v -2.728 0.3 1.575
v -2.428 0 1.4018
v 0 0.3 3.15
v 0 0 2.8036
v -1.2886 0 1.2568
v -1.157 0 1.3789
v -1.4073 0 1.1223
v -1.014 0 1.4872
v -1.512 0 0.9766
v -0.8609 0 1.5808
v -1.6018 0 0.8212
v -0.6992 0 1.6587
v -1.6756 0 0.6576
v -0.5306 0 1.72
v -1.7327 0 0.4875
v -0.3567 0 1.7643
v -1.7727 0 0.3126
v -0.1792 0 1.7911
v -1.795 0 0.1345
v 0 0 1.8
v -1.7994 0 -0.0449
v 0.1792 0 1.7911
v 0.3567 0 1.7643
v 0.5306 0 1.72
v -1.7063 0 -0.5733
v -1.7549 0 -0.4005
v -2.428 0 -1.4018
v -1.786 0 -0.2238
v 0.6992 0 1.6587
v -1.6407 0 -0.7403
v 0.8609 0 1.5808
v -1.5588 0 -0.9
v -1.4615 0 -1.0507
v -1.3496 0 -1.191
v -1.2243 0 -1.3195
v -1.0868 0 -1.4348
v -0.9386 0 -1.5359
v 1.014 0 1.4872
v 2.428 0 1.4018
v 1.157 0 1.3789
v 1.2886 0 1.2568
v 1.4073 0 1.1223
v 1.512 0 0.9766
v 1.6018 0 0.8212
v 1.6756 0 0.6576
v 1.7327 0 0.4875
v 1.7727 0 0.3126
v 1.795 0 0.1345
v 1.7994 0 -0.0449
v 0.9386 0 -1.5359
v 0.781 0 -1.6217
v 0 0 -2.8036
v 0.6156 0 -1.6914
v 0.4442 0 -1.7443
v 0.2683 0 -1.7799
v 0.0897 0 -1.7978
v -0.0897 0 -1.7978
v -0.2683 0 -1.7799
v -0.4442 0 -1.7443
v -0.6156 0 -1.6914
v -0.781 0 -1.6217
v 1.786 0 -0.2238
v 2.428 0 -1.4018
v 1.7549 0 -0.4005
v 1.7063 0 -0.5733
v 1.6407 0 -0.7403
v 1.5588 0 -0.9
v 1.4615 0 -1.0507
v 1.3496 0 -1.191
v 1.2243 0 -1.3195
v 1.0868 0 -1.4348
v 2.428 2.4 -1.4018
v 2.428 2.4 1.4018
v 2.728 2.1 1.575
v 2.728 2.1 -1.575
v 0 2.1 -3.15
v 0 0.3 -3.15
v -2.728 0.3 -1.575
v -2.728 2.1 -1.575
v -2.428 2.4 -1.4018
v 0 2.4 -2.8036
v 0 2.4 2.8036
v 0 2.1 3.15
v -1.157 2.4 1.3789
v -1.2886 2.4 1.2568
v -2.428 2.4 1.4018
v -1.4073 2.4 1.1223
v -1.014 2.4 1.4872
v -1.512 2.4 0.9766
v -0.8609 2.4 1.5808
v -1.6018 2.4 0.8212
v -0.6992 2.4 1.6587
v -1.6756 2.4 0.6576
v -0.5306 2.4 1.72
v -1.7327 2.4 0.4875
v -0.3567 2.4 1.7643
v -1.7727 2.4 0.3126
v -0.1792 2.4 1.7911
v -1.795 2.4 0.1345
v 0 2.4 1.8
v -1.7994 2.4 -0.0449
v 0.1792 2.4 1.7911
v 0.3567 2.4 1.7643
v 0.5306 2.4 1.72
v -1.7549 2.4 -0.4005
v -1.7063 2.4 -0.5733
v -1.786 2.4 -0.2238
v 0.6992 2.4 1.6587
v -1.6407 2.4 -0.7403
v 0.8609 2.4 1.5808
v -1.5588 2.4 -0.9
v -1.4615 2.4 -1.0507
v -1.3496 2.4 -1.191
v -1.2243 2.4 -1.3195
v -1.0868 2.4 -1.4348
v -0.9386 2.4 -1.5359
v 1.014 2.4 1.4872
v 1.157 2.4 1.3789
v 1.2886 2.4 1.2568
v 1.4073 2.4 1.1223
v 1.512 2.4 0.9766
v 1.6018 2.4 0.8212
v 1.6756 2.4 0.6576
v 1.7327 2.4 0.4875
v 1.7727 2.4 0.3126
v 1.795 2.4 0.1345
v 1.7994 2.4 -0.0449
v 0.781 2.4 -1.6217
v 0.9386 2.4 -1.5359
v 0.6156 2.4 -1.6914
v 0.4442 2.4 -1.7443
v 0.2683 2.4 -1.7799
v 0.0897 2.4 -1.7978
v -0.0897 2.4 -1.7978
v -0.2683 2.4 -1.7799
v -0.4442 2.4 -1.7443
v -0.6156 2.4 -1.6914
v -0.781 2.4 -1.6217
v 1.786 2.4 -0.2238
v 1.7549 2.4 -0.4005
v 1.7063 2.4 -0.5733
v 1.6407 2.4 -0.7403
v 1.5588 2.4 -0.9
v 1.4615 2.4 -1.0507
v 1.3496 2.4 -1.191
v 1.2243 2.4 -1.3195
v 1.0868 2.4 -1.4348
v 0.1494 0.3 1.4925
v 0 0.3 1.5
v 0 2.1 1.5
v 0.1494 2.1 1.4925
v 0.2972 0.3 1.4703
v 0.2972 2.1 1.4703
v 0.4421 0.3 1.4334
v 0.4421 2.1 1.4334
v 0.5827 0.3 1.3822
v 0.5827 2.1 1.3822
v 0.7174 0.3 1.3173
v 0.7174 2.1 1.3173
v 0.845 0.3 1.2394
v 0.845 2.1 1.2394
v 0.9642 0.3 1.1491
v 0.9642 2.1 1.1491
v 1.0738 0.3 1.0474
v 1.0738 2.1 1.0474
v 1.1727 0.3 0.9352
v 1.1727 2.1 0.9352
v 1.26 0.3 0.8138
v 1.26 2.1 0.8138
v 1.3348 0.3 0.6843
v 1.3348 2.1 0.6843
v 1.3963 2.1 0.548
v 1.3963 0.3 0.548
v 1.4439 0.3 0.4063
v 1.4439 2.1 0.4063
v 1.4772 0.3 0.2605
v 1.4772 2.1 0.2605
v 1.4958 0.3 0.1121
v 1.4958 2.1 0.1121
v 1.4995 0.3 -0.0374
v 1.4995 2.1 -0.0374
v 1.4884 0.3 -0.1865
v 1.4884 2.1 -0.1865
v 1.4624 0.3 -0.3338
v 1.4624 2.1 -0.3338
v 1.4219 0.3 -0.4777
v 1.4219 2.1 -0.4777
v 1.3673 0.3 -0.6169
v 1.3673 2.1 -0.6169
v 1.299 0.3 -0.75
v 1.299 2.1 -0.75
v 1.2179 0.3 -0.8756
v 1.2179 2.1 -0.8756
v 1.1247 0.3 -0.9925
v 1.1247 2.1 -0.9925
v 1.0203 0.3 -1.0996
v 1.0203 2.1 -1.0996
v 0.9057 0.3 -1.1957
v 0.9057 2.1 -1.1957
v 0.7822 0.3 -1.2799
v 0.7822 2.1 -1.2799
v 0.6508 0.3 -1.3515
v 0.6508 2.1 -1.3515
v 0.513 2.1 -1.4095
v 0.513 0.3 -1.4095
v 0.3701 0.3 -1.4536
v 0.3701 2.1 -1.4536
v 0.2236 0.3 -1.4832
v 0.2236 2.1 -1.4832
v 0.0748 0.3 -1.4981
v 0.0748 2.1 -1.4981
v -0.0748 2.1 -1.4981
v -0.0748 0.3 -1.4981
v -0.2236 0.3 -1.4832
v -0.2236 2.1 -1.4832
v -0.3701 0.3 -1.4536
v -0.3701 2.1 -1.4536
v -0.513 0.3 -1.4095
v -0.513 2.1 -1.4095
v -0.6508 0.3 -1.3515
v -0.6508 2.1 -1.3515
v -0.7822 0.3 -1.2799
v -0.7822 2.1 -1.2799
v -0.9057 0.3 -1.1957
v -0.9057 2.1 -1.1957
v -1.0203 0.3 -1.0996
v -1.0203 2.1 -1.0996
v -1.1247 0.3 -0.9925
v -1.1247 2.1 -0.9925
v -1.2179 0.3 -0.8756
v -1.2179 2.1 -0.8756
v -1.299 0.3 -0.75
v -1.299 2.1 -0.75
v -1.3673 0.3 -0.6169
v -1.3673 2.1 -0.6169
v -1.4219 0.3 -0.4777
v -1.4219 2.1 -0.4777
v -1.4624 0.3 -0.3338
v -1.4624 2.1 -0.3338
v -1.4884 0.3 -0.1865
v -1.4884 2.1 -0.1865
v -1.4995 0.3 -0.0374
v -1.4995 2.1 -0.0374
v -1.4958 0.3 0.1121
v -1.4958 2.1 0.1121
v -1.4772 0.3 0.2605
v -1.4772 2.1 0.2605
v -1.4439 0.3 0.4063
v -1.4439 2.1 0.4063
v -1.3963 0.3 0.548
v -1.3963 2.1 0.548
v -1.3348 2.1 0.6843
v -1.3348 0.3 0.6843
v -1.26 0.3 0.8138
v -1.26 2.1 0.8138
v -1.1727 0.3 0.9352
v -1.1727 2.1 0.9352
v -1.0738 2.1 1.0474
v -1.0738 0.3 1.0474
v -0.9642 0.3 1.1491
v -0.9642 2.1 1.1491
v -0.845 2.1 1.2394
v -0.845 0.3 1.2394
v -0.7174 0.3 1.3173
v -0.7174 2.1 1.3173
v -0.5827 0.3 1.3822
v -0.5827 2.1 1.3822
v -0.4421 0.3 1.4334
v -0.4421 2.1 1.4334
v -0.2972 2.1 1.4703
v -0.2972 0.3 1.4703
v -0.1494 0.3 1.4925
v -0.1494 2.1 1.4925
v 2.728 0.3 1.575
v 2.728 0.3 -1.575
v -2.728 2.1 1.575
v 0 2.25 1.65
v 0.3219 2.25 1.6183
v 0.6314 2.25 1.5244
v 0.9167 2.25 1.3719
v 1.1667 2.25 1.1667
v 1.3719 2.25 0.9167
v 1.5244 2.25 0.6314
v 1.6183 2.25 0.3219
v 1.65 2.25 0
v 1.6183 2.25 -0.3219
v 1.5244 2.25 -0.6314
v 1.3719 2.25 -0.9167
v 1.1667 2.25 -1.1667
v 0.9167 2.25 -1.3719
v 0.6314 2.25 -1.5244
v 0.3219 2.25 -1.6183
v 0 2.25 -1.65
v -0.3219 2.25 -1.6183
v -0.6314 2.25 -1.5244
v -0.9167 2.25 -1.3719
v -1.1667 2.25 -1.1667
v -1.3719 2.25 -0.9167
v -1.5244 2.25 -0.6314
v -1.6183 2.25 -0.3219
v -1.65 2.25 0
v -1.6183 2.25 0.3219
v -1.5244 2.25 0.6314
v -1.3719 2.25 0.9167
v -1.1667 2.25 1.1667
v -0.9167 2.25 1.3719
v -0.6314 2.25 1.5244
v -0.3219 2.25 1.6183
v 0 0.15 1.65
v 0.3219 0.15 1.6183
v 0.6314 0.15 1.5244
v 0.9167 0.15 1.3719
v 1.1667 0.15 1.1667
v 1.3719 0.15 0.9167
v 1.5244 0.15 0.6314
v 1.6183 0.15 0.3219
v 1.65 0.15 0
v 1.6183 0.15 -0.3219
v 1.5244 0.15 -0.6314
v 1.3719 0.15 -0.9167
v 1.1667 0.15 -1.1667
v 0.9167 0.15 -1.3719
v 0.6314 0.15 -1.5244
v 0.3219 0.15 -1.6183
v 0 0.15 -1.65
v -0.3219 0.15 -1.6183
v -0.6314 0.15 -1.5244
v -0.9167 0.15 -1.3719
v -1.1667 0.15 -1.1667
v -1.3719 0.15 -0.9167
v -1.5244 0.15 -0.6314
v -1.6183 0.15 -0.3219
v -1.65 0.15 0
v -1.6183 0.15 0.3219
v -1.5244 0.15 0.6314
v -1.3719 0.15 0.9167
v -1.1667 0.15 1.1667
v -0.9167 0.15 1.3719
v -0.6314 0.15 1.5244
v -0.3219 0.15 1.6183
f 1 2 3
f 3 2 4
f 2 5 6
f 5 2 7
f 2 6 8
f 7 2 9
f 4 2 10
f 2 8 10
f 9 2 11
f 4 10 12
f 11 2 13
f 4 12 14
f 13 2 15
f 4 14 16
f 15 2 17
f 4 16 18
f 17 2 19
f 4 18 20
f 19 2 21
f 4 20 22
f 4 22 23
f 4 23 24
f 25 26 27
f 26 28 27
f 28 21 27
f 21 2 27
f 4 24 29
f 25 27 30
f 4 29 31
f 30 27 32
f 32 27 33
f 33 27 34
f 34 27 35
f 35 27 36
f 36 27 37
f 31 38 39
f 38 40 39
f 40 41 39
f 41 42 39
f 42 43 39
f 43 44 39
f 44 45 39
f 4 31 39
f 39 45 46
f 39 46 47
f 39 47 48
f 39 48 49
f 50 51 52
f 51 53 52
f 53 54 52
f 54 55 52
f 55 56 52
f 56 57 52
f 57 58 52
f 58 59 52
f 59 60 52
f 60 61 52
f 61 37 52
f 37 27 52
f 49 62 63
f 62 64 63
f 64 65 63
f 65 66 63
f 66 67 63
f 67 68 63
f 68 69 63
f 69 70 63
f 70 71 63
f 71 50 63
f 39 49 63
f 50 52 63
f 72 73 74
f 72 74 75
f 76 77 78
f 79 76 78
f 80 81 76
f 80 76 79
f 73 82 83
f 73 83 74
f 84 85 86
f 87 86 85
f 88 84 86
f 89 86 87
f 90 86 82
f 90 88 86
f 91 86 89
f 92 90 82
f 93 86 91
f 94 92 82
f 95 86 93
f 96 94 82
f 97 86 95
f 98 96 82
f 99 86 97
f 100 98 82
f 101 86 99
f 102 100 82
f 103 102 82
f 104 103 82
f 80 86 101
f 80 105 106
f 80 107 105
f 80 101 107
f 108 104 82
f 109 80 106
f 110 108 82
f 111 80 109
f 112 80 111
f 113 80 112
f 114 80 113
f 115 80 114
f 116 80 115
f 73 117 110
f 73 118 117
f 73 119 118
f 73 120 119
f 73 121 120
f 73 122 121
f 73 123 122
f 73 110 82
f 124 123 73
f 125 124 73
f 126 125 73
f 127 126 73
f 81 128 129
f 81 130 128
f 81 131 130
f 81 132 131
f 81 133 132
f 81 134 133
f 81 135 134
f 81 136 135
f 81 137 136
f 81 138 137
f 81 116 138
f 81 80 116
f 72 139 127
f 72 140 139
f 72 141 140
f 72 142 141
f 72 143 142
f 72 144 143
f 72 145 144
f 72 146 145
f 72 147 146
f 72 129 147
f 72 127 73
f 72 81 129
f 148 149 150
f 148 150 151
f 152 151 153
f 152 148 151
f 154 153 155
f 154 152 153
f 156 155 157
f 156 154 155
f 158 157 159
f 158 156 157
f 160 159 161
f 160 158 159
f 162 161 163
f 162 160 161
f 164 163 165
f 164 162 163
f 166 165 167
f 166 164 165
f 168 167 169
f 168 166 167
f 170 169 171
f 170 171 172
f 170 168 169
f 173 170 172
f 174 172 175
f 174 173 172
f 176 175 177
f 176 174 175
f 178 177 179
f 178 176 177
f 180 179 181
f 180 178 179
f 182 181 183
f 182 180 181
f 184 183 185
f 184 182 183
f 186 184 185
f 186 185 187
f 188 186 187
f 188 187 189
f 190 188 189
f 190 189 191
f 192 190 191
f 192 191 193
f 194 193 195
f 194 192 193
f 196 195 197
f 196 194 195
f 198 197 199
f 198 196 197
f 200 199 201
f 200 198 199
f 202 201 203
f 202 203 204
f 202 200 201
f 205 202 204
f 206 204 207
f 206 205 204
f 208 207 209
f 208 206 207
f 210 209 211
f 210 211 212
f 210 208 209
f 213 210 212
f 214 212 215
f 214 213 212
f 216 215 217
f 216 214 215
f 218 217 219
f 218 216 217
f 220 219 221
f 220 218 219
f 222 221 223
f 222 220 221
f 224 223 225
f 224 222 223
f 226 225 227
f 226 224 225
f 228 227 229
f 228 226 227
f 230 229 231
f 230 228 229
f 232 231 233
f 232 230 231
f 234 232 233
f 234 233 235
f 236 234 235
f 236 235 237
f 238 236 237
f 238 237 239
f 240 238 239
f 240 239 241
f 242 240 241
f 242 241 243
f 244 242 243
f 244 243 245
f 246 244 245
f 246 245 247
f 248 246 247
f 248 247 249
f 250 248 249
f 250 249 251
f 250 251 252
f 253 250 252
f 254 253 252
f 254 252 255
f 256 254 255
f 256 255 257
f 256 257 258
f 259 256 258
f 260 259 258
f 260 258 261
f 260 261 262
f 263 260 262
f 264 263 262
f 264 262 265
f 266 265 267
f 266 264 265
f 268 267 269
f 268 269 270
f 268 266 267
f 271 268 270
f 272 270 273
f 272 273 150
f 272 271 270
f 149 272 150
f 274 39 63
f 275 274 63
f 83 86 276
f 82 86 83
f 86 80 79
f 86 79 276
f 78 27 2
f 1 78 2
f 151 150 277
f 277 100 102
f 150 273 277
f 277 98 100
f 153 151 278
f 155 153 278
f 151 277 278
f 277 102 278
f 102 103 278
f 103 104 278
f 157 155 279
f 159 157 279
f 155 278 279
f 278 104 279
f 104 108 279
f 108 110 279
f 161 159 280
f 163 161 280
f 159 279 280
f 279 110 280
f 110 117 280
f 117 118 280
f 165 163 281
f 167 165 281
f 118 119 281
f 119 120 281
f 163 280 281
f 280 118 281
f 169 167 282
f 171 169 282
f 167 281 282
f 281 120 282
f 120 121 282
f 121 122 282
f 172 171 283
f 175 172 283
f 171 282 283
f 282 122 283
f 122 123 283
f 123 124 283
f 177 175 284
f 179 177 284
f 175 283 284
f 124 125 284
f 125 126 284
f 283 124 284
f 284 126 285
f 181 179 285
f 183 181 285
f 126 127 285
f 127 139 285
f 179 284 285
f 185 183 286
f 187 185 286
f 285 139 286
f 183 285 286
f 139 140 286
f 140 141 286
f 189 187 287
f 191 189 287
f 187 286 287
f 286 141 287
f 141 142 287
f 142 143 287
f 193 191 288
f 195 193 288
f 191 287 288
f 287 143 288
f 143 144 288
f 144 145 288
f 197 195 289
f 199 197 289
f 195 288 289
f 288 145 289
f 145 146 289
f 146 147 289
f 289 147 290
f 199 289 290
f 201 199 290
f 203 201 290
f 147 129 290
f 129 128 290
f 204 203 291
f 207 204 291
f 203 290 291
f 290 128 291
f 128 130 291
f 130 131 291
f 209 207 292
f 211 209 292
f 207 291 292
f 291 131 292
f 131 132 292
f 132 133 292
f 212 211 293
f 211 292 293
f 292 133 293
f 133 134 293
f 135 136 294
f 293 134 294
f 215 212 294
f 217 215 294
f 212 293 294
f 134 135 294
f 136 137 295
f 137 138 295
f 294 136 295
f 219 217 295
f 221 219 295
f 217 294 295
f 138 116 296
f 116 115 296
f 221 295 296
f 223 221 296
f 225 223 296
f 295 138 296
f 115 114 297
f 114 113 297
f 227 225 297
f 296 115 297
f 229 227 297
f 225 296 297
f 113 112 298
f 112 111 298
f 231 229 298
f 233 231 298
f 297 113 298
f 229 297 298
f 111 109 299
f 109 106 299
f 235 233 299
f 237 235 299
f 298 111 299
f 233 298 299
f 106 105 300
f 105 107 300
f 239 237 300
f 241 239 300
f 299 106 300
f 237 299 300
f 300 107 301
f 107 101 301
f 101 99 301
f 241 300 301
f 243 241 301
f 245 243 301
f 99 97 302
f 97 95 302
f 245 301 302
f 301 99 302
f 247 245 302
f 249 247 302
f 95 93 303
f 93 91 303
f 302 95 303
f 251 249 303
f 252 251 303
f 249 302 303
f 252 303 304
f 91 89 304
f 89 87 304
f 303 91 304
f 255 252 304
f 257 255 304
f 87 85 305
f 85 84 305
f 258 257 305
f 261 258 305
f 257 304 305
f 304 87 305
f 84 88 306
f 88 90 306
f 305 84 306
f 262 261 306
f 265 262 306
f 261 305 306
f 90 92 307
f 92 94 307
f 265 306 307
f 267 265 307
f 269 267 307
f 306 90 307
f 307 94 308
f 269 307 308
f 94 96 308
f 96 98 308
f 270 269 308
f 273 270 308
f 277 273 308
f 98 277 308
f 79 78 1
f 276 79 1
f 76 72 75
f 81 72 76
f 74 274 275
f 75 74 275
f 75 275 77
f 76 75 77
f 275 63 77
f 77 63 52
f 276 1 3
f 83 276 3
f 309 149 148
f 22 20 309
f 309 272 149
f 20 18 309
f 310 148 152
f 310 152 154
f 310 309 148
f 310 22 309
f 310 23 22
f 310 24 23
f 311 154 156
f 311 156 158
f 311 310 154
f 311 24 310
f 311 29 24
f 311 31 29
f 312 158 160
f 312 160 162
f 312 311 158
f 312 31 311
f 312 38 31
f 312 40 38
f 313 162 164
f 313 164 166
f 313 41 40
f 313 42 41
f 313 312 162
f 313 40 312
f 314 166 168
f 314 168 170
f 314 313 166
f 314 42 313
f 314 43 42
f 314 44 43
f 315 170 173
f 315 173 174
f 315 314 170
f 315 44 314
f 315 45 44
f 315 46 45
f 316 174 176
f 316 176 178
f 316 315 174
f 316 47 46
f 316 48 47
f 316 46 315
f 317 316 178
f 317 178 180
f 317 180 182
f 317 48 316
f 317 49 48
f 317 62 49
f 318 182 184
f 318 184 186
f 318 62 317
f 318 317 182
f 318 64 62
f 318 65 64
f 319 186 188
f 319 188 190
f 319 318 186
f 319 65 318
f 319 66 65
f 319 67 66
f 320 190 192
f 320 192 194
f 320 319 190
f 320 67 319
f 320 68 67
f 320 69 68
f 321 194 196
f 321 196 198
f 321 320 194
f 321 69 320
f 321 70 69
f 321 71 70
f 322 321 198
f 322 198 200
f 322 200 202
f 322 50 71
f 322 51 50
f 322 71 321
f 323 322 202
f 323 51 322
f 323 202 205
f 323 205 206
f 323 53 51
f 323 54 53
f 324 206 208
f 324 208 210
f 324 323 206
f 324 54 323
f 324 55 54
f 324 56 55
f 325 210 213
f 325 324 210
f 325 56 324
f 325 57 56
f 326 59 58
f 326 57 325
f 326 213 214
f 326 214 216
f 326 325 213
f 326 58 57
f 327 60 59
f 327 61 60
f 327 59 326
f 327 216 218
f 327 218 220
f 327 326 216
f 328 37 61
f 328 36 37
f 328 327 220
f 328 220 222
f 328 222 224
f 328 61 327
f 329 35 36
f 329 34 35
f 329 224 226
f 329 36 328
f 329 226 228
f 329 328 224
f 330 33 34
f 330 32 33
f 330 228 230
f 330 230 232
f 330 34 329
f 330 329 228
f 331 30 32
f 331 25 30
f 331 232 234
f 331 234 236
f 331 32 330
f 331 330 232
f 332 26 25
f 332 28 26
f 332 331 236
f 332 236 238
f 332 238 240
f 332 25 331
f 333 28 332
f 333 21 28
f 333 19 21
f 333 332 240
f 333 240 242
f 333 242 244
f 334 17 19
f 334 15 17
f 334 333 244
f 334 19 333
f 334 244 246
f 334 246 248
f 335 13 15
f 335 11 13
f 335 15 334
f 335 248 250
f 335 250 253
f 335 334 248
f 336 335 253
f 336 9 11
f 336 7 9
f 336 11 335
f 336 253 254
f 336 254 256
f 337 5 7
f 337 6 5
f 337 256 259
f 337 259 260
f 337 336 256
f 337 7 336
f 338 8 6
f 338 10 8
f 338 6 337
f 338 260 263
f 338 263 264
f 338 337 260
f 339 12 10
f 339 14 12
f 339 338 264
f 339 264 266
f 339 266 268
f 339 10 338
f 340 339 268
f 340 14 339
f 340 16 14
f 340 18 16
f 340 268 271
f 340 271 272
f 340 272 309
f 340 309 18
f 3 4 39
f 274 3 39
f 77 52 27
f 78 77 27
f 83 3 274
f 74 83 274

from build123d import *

# Parameters (mm, degrees)
ESQUISSE1_R        = 1.5
BOSS_EXTRU_1_DEPTH = 2.4
CHANFREIN1_SIZE    = 0.3


with BuildPart() as part:
    # Esquisse1 → Boss.-Extru.1 (new body)
    with BuildSketch(Plane(origin=(0, 0, 0), x_dir=(1, 0, 0), z_dir=(0, 1, 0))):
        Polygon((0, 3.15), (-2.727980022, 1.575), (-2.727980022, -1.575), (0, -3.15), (2.727980022, -1.575), (2.727980022, 1.575), align=None)
        with Locations(Location((0, 0, 0), (0, 0, 270))):
            Circle(ESQUISSE1_R, mode=Mode.SUBTRACT)
    extrude(amount=BOSS_EXTRU_1_DEPTH)

    # Chanfrein1
    chanfrein1_edges = [part.edges().sort_by_distance(p)[0] for p in [
        (-2.727980022, 2.4, 0),
        (-1.363990011, 2.4, 2.3625),
        (0, 0, -1.5),
        (0, 2.4, -1.5),
        (1.363990011, 2.4, 2.3625),
        (2.727980022, 2.4, 0),
        (1.363990011, 2.4, -2.3625),
        (2.727980022, 0, 0),
        (1.363990011, 0, 2.3625),
        (-1.363990011, 0, 2.3625),
        (-2.727980022, 0, 0),
        (-1.363990011, 0, -2.3625),
        (1.363990011, 0, -2.3625),
        (-1.363990011, 2.4, -2.3625),
    ]]
    chamfer(chanfrein1_edges, length=CHANFREIN1_SIZE)


solid = part.part
